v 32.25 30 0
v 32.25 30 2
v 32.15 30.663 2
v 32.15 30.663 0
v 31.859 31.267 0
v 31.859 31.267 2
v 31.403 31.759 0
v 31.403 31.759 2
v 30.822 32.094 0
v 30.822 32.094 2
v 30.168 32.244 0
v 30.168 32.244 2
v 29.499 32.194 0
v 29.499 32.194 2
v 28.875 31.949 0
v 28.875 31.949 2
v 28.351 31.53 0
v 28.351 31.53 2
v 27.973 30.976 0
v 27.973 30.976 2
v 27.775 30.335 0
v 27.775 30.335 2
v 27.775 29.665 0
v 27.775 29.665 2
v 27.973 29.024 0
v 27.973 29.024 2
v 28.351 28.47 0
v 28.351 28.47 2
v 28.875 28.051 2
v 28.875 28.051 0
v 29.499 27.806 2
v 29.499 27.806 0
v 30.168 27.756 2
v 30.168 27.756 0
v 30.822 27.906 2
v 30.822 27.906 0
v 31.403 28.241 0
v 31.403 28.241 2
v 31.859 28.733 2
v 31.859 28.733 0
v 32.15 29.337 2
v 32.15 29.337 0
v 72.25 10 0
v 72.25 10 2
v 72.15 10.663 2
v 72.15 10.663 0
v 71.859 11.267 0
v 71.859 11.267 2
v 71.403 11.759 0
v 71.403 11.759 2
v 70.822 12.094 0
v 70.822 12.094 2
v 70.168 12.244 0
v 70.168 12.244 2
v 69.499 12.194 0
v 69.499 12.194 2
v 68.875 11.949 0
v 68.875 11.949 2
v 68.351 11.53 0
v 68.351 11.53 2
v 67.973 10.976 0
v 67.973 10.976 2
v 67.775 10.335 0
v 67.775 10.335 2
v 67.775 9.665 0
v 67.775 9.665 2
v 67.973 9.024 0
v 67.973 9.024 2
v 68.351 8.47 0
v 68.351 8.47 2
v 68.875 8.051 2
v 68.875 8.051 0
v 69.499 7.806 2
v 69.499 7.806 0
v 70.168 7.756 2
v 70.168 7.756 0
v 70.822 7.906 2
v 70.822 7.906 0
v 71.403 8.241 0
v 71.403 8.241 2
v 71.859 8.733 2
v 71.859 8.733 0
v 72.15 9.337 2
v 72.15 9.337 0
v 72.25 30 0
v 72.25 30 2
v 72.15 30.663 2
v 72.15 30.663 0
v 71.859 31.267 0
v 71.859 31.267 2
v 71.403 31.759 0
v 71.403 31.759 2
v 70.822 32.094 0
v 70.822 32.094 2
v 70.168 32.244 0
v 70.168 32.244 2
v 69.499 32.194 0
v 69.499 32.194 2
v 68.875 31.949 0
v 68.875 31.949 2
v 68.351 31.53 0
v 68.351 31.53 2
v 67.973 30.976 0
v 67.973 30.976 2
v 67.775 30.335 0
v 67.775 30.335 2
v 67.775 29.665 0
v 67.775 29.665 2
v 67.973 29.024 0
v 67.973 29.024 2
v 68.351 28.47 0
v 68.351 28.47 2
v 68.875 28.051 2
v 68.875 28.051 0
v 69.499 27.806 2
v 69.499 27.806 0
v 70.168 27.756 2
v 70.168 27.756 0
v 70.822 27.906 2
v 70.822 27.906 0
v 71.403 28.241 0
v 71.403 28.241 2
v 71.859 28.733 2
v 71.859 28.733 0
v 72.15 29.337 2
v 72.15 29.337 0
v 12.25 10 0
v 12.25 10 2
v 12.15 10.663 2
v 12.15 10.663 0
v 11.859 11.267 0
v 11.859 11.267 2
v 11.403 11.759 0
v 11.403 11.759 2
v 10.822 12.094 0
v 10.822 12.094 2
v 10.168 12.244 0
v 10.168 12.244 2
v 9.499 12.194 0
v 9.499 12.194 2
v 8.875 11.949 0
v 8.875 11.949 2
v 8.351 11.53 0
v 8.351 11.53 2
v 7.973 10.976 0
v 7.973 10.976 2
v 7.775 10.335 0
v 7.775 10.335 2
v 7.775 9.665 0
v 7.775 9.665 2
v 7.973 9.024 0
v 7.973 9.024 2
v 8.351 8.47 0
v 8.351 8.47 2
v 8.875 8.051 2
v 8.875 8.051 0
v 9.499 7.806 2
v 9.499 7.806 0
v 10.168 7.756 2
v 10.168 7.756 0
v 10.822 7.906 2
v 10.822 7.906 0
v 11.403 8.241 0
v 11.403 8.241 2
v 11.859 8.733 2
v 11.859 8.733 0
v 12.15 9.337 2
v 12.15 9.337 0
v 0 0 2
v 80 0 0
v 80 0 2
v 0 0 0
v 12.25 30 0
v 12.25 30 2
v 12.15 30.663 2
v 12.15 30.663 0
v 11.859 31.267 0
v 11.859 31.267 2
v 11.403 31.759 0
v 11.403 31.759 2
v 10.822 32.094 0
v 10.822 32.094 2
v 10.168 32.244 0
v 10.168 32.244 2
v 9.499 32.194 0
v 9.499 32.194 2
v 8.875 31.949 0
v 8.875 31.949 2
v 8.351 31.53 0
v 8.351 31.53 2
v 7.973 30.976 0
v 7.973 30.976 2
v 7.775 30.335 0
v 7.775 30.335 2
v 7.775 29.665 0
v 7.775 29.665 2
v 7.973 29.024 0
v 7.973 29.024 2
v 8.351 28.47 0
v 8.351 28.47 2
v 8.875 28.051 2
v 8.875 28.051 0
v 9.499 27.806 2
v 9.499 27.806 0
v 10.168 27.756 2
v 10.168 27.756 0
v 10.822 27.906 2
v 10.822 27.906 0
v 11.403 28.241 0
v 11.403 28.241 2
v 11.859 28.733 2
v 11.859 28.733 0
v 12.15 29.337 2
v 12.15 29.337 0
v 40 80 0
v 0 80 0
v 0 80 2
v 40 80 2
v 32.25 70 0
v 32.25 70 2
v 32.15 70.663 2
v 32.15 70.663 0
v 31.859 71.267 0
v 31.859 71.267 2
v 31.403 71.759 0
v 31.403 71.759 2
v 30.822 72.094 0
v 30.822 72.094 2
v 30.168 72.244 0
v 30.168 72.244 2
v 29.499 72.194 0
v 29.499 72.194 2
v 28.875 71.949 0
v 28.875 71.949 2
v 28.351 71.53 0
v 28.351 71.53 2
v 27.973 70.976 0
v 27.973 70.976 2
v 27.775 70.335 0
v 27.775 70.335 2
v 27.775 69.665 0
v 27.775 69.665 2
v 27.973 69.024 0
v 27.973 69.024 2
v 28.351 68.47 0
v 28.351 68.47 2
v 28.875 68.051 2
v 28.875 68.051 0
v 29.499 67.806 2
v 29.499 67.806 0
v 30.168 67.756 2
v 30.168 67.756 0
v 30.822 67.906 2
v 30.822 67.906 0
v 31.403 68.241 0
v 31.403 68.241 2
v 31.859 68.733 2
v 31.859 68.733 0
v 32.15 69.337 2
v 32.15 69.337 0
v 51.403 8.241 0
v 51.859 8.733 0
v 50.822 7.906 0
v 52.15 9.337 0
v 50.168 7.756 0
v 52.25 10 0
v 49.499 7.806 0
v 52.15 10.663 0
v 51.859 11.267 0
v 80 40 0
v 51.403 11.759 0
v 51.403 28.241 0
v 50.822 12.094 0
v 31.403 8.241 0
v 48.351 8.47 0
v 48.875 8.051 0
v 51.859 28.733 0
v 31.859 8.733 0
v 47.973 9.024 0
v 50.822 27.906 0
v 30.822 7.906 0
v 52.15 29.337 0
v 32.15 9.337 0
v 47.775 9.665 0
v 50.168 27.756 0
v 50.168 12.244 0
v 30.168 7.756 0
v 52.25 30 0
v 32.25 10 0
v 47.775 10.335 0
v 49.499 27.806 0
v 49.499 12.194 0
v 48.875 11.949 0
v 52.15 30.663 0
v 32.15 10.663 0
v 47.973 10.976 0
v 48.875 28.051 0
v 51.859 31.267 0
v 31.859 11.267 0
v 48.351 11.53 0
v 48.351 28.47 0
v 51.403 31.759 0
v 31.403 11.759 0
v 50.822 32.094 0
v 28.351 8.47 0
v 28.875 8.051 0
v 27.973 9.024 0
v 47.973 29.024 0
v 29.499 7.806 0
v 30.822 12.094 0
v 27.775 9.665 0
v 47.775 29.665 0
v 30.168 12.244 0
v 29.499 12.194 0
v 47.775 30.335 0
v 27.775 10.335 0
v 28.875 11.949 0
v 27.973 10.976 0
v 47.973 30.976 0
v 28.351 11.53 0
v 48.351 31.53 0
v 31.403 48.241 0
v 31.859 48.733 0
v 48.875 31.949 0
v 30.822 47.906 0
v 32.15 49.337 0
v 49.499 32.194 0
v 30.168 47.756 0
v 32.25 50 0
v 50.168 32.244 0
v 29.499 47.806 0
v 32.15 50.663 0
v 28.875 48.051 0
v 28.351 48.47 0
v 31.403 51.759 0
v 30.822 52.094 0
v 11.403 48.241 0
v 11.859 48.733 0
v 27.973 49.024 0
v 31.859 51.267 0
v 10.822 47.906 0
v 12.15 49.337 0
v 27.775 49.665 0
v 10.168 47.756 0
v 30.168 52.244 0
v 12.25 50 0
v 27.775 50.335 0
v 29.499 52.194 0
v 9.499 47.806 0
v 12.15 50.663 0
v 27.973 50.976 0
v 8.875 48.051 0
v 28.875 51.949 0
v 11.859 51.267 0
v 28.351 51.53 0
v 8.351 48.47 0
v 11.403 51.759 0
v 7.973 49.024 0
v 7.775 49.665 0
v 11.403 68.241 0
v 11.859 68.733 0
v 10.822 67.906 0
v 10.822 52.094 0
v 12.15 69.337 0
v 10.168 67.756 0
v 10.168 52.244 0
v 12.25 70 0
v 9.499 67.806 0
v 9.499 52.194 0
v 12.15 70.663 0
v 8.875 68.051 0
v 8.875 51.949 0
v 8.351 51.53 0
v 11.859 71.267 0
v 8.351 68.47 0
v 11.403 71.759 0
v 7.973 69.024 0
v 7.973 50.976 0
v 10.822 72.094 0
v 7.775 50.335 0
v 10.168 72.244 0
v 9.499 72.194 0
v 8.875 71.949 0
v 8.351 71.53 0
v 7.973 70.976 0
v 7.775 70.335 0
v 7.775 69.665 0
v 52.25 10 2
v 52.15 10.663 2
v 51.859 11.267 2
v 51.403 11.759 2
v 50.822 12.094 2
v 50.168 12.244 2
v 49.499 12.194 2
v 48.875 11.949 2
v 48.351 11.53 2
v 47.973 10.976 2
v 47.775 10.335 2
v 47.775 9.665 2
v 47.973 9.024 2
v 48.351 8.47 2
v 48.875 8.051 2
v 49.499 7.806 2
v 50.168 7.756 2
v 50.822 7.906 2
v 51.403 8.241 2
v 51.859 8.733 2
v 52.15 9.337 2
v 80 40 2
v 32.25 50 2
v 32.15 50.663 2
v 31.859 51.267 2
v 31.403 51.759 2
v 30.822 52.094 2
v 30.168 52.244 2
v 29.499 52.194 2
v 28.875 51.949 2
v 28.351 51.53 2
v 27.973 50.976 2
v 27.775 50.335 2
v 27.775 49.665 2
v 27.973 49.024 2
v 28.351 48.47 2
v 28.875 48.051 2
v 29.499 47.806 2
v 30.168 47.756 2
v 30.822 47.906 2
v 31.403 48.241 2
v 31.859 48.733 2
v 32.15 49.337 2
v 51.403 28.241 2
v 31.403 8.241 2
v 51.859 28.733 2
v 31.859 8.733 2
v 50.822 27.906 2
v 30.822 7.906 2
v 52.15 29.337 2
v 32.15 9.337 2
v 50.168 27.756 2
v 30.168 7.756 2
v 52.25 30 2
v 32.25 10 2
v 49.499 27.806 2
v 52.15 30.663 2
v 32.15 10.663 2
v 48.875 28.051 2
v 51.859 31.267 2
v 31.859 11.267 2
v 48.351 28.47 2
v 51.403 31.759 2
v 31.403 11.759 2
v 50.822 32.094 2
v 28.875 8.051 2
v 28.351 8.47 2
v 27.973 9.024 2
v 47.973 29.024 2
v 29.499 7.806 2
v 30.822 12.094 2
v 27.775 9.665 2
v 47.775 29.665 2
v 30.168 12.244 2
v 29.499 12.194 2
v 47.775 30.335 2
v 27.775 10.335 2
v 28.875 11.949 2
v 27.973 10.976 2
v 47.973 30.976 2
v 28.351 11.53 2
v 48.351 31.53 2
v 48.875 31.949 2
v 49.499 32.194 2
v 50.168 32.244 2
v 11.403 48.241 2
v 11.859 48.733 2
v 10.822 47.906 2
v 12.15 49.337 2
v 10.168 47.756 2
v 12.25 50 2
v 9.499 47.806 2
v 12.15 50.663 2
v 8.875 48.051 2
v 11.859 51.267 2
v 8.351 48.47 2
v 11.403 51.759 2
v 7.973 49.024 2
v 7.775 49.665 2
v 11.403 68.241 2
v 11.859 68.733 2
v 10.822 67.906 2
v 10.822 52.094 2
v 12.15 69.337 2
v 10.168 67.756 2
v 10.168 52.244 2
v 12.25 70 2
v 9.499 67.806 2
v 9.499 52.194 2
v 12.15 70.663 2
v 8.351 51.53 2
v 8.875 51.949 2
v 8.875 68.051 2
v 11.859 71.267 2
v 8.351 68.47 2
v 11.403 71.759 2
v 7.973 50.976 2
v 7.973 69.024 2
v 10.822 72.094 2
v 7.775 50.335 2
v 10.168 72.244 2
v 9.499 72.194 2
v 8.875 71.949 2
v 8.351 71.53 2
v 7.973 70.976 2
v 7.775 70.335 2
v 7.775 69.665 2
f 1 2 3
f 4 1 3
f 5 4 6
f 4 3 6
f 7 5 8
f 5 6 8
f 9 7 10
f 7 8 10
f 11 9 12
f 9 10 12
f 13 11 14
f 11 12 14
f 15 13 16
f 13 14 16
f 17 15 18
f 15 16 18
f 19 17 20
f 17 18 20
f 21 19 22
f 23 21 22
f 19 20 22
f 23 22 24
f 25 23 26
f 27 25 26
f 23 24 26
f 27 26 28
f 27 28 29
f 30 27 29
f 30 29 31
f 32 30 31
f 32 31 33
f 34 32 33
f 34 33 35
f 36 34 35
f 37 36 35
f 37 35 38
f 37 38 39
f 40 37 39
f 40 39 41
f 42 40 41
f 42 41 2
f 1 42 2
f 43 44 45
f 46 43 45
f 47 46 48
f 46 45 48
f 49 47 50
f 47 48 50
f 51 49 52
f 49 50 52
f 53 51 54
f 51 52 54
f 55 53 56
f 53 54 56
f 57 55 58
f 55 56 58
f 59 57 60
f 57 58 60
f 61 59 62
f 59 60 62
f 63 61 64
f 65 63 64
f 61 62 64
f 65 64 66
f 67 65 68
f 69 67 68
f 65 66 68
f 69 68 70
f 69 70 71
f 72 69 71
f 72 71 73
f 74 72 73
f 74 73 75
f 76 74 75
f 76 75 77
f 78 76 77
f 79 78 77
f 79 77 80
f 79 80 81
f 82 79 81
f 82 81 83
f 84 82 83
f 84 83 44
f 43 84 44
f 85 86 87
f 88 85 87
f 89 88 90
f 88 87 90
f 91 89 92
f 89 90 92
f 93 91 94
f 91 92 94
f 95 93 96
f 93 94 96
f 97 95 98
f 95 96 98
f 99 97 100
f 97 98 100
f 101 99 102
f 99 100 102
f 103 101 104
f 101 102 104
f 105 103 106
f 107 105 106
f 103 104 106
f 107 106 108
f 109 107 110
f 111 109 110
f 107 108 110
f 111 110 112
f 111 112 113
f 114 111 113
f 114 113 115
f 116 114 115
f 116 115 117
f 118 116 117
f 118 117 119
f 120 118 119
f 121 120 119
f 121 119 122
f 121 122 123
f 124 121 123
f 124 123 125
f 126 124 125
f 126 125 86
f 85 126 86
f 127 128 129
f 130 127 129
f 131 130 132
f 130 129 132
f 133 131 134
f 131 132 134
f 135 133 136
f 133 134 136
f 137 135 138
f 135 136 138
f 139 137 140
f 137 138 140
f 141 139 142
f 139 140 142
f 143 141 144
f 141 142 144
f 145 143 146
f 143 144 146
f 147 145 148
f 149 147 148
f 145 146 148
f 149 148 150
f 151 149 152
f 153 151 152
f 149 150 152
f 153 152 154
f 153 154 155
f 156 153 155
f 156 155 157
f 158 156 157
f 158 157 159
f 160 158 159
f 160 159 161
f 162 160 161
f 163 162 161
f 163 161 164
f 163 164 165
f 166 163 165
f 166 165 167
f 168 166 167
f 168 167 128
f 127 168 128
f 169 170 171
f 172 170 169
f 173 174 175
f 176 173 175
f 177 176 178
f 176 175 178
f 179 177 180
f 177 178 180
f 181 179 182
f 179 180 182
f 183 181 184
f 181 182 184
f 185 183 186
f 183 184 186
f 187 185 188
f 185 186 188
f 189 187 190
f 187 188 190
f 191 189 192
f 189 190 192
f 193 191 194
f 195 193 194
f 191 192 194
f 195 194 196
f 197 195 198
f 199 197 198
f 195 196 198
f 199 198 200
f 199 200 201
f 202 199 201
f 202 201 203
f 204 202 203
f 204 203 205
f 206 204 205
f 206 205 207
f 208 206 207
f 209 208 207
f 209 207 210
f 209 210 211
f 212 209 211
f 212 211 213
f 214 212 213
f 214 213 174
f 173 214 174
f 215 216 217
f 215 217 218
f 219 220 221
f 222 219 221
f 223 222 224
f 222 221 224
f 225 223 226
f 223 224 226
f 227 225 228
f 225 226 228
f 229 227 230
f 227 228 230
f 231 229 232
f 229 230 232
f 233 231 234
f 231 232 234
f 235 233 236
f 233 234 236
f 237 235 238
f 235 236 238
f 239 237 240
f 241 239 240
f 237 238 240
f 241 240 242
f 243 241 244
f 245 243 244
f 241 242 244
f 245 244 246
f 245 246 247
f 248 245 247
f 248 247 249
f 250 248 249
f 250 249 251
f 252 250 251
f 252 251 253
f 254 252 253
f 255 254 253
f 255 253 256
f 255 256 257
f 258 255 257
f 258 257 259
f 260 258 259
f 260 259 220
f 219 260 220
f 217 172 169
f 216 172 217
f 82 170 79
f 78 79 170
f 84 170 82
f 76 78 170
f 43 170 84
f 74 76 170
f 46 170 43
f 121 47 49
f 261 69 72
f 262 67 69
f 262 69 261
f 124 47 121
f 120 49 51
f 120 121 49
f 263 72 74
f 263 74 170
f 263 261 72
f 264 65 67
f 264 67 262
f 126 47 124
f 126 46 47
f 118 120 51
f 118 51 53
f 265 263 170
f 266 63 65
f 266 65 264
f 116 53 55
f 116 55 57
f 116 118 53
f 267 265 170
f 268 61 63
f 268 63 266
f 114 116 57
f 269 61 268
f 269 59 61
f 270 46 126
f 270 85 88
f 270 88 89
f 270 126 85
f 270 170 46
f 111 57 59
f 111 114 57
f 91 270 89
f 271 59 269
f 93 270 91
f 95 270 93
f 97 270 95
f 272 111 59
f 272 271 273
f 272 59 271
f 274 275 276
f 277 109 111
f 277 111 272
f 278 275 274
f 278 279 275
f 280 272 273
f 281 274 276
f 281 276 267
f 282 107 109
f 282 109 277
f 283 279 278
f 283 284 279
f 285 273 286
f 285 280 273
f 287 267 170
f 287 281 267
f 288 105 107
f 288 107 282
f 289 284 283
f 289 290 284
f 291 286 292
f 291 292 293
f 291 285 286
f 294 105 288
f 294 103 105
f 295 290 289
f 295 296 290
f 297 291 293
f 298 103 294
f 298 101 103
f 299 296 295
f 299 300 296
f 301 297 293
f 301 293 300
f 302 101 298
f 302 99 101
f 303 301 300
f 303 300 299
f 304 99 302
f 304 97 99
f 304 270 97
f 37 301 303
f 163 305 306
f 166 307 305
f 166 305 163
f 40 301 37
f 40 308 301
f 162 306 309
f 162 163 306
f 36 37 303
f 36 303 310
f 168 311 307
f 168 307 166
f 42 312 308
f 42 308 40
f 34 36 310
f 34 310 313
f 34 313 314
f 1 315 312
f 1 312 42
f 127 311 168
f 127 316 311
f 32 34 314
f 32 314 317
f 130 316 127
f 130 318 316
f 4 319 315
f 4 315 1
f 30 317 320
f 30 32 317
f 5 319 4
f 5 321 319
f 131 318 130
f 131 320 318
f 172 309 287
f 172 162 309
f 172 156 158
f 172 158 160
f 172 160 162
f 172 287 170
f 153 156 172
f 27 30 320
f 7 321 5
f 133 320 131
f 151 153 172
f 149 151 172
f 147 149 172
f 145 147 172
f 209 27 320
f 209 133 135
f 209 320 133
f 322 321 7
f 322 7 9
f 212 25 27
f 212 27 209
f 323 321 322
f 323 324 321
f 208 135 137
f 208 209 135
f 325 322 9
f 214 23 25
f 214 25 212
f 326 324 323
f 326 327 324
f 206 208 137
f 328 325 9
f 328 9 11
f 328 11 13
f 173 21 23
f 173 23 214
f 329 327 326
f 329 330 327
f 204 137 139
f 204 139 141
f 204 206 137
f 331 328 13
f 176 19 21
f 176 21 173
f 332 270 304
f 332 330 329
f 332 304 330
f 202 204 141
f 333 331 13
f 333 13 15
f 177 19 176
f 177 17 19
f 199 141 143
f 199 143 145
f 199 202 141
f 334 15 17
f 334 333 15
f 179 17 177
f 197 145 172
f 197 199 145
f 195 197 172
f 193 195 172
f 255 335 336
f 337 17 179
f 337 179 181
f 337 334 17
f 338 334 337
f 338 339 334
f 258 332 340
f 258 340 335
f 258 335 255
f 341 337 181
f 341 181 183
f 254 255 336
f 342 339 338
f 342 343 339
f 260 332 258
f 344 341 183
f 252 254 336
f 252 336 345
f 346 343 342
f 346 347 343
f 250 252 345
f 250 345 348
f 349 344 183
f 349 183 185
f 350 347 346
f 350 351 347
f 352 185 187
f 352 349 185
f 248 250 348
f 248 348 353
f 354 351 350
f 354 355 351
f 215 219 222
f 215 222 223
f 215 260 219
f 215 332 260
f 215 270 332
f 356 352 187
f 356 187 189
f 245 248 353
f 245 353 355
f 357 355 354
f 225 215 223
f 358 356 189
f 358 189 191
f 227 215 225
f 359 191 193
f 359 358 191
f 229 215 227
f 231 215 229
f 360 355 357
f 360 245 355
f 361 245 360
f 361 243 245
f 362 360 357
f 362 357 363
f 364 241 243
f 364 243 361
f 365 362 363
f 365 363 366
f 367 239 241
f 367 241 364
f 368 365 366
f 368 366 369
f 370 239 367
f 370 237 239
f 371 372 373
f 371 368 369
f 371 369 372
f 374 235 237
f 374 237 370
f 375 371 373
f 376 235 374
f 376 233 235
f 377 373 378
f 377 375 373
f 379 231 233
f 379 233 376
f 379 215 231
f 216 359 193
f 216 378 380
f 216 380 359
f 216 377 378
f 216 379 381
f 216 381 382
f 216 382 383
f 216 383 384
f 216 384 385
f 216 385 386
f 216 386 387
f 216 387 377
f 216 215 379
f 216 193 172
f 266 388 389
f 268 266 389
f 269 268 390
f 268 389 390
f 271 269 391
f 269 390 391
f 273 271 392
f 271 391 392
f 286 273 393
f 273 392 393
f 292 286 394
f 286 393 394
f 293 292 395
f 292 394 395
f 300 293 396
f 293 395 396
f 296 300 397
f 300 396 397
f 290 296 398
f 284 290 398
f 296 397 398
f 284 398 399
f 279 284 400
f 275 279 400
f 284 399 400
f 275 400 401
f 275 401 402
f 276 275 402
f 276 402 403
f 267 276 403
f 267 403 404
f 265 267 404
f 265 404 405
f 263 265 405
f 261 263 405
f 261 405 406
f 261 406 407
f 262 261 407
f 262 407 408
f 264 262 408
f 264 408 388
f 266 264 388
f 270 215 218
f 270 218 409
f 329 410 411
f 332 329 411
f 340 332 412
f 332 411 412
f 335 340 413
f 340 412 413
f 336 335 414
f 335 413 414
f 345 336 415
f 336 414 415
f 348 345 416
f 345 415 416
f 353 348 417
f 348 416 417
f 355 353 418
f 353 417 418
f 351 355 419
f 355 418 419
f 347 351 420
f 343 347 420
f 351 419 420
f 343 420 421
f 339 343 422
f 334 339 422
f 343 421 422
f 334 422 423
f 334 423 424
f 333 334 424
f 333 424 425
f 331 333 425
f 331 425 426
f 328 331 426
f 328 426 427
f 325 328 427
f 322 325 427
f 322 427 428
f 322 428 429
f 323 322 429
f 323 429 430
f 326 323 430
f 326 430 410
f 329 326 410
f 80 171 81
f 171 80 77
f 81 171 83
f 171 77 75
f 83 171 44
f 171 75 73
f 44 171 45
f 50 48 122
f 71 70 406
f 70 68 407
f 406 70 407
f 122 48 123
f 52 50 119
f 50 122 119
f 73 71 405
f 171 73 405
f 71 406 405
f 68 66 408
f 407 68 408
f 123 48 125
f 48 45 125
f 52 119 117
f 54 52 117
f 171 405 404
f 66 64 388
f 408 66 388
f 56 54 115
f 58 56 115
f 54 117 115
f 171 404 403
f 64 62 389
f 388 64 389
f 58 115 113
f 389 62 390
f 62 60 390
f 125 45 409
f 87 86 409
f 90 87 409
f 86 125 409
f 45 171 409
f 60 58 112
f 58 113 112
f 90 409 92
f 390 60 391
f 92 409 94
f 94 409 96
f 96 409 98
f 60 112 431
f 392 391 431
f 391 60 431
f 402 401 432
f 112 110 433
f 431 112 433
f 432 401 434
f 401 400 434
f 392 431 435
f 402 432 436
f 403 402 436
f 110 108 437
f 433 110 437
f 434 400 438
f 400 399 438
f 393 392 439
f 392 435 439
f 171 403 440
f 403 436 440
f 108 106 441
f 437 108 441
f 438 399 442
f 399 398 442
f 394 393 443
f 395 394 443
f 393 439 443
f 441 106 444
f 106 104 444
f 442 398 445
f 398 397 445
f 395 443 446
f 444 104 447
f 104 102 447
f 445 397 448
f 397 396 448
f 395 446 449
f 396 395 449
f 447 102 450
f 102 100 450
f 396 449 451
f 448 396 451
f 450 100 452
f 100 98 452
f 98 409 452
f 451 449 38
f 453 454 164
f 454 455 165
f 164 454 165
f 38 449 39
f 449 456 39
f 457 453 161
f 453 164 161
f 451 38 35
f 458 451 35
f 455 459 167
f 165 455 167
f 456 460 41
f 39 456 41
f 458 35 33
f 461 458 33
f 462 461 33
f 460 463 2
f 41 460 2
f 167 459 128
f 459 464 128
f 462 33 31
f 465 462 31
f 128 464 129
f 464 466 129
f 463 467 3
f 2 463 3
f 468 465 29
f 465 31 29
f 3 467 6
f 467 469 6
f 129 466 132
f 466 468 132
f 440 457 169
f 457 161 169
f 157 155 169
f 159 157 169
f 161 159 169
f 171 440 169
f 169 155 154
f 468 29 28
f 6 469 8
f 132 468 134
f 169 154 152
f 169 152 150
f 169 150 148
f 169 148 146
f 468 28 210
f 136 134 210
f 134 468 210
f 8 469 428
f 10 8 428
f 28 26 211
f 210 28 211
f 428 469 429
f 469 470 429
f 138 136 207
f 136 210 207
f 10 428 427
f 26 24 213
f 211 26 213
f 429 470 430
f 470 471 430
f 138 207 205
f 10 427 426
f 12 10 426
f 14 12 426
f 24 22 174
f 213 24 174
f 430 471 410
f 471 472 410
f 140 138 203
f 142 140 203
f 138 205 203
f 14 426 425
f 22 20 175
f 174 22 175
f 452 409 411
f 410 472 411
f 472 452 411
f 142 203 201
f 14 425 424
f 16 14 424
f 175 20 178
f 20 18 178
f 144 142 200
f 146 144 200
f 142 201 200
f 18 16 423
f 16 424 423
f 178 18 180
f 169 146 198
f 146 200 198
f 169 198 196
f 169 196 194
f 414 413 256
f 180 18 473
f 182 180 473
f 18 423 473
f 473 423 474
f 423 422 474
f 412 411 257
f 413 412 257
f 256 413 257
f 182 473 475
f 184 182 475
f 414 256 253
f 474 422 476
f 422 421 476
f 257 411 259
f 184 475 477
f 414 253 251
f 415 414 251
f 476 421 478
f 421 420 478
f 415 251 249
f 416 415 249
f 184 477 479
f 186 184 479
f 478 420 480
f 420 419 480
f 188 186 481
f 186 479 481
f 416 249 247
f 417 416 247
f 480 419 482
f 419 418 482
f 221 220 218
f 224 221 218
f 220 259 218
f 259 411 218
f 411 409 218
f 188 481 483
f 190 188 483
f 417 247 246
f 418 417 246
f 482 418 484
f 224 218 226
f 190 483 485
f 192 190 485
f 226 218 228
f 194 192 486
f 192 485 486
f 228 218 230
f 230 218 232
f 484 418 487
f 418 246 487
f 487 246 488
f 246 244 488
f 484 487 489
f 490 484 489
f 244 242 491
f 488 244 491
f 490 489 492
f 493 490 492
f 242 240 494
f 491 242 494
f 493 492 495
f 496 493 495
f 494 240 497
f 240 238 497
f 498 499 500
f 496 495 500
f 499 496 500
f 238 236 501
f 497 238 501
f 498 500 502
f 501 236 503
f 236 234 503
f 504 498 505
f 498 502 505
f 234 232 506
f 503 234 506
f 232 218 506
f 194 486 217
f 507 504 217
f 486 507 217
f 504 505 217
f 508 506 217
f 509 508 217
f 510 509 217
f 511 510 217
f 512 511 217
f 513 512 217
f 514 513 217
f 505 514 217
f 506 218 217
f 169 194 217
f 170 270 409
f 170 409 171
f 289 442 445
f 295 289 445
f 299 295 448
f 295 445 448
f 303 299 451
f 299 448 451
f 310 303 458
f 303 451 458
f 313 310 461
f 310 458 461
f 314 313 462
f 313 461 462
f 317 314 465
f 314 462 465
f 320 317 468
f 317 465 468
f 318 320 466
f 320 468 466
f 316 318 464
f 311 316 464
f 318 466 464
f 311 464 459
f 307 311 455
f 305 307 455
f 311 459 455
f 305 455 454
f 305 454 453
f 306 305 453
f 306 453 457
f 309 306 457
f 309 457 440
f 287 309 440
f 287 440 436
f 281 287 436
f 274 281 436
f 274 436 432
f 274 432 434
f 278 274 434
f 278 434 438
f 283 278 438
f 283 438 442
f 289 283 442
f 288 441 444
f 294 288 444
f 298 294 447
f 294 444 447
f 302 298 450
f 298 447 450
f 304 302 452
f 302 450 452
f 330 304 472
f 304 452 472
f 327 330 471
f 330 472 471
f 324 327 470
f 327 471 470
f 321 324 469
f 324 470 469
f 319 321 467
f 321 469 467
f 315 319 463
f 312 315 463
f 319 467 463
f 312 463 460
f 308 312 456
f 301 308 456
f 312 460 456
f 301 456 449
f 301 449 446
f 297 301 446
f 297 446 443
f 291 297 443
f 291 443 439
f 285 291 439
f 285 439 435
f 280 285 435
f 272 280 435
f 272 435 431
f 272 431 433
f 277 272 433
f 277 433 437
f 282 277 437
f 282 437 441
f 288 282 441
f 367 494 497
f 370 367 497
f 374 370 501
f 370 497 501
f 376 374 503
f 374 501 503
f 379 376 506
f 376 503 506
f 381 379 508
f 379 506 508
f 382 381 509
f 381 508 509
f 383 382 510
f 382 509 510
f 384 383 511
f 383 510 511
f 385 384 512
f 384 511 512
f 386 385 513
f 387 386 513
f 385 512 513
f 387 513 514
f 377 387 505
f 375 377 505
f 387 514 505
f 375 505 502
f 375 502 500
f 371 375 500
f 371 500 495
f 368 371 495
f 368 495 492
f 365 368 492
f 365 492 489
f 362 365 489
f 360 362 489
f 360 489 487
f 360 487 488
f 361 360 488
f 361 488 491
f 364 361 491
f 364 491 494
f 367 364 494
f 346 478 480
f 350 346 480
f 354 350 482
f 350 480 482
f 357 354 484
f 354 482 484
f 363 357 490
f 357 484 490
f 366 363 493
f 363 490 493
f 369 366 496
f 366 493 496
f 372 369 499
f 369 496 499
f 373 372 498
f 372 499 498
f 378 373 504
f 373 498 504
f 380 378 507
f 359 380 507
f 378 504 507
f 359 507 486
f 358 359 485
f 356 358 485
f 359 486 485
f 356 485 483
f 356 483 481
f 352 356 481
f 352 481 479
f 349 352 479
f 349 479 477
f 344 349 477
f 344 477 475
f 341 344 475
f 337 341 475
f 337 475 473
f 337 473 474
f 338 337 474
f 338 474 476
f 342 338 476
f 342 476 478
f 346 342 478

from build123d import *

# Parameters (mm, degrees)
EXTRUDE_1_DEPTH       = 2
HOLE_WIZARD_M41_D     = 4.5
HOLE_WIZARD_M41_DEPTH = 5
HOLE_WIZARD_M41_TIP   = 1.351936393


with BuildPart() as part:
    # Эскиз1 → Бобышка-Вытянуть1 (new body)
    with BuildSketch(Plane.XY):
        Polygon((0, 0), (0, 80), (40, 80), (80, 40), (80, 0), align=None)
    extrude(amount=EXTRUDE_1_DEPTH)

    # Отверстие с зазором M41
    with Locations(Plane(origin=(0, 0, 0), x_dir=(-1, 0, 0), z_dir=(0, 0, -1))):
        with Locations((-70, 10), (-30, 50), (-50, 10), (-10, 50), (-70, 30), (-30, 70), (-50, 30), (-10, 70), (-30, 10), (-10, 10), (-30, 30), (-10, 30)):
            Hole(HOLE_WIZARD_M41_D / 2, depth=HOLE_WIZARD_M41_DEPTH)
            with Locations((0, 0, -(HOLE_WIZARD_M41_DEPTH + HOLE_WIZARD_M41_TIP / 2))):  # 118° drill point
                Cone(0, HOLE_WIZARD_M41_D / 2, HOLE_WIZARD_M41_TIP, mode=Mode.SUBTRACT)


solid = part.part
